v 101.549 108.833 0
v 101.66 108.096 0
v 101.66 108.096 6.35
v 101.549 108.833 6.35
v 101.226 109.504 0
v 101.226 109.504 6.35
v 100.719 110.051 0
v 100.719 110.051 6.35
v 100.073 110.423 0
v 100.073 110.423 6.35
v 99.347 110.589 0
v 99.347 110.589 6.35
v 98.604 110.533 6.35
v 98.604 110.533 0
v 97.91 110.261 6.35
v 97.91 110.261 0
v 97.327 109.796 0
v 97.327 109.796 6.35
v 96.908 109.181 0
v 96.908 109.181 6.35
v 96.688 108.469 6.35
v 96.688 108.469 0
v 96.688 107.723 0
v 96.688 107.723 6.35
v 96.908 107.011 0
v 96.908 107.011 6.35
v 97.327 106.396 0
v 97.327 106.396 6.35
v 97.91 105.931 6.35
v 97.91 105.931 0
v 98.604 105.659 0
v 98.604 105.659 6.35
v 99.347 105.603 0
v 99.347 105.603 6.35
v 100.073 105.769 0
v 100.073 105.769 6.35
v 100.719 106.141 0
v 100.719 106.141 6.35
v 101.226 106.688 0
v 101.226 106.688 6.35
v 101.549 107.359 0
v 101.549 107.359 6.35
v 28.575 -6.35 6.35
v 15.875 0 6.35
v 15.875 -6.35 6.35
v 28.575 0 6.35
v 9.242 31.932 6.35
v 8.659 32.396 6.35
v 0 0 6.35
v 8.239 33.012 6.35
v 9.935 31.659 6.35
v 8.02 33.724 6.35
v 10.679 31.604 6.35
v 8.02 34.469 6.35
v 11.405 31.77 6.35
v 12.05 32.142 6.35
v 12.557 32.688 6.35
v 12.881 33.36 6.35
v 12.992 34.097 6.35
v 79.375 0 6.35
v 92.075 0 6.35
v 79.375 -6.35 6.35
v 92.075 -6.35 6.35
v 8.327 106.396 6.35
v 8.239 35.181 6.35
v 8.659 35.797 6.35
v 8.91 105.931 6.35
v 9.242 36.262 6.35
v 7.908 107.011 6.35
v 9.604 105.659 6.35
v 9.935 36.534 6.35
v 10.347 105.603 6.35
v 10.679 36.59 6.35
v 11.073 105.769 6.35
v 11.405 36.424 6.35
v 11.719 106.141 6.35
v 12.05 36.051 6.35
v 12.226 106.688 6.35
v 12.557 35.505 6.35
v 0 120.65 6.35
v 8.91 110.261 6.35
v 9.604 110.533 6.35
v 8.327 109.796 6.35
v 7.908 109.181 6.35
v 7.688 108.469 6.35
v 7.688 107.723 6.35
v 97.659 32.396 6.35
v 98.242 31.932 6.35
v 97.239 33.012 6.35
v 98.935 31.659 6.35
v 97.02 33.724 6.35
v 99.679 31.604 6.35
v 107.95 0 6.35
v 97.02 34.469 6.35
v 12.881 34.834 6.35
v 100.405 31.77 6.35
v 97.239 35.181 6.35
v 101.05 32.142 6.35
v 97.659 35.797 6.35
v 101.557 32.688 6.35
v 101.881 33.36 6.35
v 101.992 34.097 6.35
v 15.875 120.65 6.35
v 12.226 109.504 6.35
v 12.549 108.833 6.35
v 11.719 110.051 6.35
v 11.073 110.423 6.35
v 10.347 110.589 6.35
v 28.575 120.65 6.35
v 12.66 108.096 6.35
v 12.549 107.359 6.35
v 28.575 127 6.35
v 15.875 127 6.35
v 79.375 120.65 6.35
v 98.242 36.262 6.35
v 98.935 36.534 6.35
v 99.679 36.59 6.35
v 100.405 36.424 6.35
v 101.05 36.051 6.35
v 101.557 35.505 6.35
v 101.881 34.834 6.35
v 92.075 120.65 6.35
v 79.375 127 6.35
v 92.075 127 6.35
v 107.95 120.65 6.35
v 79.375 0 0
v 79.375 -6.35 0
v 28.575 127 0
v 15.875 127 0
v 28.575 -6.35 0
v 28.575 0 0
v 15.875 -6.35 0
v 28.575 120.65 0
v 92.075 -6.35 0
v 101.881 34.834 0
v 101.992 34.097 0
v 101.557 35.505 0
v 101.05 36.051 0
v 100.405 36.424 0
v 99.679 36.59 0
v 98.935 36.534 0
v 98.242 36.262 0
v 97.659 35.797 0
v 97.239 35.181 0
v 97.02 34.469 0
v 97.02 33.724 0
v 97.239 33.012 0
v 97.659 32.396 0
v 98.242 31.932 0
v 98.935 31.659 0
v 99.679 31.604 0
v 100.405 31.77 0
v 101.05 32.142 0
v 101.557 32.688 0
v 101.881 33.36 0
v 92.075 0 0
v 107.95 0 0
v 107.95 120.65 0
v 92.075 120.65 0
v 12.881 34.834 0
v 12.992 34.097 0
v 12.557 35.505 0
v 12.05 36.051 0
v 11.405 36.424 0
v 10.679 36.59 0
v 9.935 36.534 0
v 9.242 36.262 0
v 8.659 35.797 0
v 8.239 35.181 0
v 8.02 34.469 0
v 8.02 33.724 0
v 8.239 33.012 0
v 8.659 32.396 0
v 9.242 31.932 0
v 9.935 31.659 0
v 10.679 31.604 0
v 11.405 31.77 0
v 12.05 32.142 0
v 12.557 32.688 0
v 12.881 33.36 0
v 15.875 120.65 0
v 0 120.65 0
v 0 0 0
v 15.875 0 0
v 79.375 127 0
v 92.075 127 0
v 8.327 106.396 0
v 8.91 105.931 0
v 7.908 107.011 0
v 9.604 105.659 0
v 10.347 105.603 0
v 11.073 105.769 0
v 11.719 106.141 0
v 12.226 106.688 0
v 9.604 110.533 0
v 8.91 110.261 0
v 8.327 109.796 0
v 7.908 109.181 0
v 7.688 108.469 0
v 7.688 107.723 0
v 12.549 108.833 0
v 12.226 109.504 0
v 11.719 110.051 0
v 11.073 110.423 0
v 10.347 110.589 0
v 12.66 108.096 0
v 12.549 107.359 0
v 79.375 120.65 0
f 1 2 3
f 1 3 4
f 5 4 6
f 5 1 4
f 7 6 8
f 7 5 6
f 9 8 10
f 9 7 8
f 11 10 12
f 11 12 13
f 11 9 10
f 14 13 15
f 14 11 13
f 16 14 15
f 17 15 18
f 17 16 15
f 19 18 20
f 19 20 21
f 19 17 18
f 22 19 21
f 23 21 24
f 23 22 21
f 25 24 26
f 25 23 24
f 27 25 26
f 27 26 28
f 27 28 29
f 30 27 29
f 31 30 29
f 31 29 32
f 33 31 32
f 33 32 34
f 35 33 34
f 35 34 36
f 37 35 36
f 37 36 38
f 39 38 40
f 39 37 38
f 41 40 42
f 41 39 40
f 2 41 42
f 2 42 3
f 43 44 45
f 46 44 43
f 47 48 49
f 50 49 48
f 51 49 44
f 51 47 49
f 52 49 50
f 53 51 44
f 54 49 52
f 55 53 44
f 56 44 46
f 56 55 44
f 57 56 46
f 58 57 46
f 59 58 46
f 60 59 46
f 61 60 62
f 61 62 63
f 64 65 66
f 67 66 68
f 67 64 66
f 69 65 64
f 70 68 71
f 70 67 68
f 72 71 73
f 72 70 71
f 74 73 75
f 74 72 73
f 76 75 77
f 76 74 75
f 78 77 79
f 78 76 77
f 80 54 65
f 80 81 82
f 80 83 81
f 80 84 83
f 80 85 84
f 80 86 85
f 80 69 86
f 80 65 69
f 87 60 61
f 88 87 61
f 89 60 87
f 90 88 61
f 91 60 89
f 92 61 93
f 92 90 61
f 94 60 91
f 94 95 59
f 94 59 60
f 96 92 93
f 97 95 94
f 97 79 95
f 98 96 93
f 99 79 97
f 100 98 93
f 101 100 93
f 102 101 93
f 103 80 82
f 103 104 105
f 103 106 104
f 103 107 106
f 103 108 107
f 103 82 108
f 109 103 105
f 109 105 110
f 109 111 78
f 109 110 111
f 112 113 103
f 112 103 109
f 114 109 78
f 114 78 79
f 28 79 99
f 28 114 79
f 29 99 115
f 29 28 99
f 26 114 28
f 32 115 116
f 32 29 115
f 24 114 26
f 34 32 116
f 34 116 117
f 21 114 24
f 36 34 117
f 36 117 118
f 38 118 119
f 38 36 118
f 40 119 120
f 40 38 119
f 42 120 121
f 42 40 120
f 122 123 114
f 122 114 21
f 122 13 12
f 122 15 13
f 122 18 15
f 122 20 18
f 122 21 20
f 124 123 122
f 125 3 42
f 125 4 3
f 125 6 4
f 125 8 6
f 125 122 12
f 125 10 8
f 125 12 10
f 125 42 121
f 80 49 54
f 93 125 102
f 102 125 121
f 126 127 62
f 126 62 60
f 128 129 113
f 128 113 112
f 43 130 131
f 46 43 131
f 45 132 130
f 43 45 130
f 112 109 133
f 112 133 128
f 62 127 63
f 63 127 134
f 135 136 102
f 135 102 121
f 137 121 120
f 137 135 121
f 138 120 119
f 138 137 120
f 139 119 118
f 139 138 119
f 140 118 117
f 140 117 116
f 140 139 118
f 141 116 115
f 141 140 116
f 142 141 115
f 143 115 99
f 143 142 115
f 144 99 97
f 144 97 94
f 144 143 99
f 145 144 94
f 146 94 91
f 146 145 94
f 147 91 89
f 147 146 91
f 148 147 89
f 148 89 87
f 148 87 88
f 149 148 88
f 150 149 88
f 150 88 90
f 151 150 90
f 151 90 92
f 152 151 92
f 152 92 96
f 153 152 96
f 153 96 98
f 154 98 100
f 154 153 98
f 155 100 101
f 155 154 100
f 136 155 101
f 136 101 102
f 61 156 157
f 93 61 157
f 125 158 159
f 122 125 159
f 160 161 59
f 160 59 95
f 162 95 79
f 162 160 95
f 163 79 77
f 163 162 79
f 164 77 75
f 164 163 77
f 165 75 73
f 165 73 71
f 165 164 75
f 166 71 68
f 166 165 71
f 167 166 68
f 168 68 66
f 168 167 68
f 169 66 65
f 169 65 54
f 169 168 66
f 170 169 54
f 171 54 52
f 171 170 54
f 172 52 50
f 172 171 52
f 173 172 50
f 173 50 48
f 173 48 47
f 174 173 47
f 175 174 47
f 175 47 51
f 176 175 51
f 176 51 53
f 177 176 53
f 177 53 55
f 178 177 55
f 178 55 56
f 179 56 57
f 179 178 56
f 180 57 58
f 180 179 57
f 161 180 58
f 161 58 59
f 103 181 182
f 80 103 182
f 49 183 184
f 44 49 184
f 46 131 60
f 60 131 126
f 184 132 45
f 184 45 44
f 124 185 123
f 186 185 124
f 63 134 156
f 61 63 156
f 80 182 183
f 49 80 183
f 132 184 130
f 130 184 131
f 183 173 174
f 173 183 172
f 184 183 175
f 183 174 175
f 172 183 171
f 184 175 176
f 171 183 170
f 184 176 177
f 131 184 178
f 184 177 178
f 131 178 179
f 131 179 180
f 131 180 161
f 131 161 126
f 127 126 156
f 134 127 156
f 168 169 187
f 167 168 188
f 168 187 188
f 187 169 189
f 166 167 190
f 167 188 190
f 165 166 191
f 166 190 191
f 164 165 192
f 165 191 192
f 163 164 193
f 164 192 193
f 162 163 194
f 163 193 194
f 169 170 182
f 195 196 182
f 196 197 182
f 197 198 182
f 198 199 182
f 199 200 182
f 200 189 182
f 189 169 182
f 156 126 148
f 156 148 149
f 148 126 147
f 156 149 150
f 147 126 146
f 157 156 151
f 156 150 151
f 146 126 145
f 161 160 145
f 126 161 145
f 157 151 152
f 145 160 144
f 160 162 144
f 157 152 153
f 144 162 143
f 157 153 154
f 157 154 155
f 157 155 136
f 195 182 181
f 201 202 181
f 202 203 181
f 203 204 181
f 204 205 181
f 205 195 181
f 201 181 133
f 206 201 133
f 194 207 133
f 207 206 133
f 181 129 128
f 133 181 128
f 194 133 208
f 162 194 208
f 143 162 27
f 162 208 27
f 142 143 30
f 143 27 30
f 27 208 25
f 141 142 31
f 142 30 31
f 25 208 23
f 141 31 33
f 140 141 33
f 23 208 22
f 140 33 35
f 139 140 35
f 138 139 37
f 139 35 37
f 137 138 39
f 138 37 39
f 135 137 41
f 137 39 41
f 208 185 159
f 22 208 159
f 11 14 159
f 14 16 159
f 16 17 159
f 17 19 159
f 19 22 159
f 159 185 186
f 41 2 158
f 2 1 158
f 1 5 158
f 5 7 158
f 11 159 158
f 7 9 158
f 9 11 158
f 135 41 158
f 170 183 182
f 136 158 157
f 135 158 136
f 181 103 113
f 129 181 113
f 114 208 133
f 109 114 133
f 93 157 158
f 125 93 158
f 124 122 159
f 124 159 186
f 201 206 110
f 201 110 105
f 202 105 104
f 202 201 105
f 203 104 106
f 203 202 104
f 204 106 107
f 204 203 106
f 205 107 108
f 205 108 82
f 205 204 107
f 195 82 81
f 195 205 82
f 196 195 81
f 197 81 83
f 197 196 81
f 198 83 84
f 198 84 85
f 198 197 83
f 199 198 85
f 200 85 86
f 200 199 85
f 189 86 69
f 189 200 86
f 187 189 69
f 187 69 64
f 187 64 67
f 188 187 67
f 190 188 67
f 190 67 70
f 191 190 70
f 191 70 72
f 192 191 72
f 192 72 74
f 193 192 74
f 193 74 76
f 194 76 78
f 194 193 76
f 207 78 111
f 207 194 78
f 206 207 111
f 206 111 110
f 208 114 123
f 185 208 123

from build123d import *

# Parameters (mm, degrees)
F0_R     = 2.5
F0_W     = 12.7
F0_H     = 6.35
F1_DEPTH = 6.35


with BuildPart() as f1:
    # F0 (on Top) → F1 (new body)
    with BuildSketch(Plane.XY):
        Polygon((0, 120.65), (0, 0), (15.875, 0), (28.575, 0), (79.375, 0), (92.075, 0), (107.95, 0), (107.95, 120.65), (92.075, 120.65), (79.375, 120.65), (28.575, 120.65), (15.875, 120.65), align=None)
        with Locations((10.491693, 34.096739)):
            Circle(F0_R, mode=Mode.SUBTRACT)
        with Locations((99.491693, 34.096739)):
            Circle(F0_R, mode=Mode.SUBTRACT)
        with Locations((10.16, 108.095996)):
            Circle(F0_R, mode=Mode.SUBTRACT)
        with Locations((99.16, 108.095996)):
            Circle(F0_R, mode=Mode.SUBTRACT)
        with Locations((22.225, 123.825)):
            Rectangle(F0_W, F0_H)
        with Locations((85.725, 123.825)):
            Rectangle(F0_W, F0_H)
        with Locations((85.725, -3.175)):
            Rectangle(F0_W, F0_H)
        with Locations((22.225, -3.175)):
            Rectangle(F0_W, F0_H)
    extrude(amount=F1_DEPTH)


solid = f1.part
